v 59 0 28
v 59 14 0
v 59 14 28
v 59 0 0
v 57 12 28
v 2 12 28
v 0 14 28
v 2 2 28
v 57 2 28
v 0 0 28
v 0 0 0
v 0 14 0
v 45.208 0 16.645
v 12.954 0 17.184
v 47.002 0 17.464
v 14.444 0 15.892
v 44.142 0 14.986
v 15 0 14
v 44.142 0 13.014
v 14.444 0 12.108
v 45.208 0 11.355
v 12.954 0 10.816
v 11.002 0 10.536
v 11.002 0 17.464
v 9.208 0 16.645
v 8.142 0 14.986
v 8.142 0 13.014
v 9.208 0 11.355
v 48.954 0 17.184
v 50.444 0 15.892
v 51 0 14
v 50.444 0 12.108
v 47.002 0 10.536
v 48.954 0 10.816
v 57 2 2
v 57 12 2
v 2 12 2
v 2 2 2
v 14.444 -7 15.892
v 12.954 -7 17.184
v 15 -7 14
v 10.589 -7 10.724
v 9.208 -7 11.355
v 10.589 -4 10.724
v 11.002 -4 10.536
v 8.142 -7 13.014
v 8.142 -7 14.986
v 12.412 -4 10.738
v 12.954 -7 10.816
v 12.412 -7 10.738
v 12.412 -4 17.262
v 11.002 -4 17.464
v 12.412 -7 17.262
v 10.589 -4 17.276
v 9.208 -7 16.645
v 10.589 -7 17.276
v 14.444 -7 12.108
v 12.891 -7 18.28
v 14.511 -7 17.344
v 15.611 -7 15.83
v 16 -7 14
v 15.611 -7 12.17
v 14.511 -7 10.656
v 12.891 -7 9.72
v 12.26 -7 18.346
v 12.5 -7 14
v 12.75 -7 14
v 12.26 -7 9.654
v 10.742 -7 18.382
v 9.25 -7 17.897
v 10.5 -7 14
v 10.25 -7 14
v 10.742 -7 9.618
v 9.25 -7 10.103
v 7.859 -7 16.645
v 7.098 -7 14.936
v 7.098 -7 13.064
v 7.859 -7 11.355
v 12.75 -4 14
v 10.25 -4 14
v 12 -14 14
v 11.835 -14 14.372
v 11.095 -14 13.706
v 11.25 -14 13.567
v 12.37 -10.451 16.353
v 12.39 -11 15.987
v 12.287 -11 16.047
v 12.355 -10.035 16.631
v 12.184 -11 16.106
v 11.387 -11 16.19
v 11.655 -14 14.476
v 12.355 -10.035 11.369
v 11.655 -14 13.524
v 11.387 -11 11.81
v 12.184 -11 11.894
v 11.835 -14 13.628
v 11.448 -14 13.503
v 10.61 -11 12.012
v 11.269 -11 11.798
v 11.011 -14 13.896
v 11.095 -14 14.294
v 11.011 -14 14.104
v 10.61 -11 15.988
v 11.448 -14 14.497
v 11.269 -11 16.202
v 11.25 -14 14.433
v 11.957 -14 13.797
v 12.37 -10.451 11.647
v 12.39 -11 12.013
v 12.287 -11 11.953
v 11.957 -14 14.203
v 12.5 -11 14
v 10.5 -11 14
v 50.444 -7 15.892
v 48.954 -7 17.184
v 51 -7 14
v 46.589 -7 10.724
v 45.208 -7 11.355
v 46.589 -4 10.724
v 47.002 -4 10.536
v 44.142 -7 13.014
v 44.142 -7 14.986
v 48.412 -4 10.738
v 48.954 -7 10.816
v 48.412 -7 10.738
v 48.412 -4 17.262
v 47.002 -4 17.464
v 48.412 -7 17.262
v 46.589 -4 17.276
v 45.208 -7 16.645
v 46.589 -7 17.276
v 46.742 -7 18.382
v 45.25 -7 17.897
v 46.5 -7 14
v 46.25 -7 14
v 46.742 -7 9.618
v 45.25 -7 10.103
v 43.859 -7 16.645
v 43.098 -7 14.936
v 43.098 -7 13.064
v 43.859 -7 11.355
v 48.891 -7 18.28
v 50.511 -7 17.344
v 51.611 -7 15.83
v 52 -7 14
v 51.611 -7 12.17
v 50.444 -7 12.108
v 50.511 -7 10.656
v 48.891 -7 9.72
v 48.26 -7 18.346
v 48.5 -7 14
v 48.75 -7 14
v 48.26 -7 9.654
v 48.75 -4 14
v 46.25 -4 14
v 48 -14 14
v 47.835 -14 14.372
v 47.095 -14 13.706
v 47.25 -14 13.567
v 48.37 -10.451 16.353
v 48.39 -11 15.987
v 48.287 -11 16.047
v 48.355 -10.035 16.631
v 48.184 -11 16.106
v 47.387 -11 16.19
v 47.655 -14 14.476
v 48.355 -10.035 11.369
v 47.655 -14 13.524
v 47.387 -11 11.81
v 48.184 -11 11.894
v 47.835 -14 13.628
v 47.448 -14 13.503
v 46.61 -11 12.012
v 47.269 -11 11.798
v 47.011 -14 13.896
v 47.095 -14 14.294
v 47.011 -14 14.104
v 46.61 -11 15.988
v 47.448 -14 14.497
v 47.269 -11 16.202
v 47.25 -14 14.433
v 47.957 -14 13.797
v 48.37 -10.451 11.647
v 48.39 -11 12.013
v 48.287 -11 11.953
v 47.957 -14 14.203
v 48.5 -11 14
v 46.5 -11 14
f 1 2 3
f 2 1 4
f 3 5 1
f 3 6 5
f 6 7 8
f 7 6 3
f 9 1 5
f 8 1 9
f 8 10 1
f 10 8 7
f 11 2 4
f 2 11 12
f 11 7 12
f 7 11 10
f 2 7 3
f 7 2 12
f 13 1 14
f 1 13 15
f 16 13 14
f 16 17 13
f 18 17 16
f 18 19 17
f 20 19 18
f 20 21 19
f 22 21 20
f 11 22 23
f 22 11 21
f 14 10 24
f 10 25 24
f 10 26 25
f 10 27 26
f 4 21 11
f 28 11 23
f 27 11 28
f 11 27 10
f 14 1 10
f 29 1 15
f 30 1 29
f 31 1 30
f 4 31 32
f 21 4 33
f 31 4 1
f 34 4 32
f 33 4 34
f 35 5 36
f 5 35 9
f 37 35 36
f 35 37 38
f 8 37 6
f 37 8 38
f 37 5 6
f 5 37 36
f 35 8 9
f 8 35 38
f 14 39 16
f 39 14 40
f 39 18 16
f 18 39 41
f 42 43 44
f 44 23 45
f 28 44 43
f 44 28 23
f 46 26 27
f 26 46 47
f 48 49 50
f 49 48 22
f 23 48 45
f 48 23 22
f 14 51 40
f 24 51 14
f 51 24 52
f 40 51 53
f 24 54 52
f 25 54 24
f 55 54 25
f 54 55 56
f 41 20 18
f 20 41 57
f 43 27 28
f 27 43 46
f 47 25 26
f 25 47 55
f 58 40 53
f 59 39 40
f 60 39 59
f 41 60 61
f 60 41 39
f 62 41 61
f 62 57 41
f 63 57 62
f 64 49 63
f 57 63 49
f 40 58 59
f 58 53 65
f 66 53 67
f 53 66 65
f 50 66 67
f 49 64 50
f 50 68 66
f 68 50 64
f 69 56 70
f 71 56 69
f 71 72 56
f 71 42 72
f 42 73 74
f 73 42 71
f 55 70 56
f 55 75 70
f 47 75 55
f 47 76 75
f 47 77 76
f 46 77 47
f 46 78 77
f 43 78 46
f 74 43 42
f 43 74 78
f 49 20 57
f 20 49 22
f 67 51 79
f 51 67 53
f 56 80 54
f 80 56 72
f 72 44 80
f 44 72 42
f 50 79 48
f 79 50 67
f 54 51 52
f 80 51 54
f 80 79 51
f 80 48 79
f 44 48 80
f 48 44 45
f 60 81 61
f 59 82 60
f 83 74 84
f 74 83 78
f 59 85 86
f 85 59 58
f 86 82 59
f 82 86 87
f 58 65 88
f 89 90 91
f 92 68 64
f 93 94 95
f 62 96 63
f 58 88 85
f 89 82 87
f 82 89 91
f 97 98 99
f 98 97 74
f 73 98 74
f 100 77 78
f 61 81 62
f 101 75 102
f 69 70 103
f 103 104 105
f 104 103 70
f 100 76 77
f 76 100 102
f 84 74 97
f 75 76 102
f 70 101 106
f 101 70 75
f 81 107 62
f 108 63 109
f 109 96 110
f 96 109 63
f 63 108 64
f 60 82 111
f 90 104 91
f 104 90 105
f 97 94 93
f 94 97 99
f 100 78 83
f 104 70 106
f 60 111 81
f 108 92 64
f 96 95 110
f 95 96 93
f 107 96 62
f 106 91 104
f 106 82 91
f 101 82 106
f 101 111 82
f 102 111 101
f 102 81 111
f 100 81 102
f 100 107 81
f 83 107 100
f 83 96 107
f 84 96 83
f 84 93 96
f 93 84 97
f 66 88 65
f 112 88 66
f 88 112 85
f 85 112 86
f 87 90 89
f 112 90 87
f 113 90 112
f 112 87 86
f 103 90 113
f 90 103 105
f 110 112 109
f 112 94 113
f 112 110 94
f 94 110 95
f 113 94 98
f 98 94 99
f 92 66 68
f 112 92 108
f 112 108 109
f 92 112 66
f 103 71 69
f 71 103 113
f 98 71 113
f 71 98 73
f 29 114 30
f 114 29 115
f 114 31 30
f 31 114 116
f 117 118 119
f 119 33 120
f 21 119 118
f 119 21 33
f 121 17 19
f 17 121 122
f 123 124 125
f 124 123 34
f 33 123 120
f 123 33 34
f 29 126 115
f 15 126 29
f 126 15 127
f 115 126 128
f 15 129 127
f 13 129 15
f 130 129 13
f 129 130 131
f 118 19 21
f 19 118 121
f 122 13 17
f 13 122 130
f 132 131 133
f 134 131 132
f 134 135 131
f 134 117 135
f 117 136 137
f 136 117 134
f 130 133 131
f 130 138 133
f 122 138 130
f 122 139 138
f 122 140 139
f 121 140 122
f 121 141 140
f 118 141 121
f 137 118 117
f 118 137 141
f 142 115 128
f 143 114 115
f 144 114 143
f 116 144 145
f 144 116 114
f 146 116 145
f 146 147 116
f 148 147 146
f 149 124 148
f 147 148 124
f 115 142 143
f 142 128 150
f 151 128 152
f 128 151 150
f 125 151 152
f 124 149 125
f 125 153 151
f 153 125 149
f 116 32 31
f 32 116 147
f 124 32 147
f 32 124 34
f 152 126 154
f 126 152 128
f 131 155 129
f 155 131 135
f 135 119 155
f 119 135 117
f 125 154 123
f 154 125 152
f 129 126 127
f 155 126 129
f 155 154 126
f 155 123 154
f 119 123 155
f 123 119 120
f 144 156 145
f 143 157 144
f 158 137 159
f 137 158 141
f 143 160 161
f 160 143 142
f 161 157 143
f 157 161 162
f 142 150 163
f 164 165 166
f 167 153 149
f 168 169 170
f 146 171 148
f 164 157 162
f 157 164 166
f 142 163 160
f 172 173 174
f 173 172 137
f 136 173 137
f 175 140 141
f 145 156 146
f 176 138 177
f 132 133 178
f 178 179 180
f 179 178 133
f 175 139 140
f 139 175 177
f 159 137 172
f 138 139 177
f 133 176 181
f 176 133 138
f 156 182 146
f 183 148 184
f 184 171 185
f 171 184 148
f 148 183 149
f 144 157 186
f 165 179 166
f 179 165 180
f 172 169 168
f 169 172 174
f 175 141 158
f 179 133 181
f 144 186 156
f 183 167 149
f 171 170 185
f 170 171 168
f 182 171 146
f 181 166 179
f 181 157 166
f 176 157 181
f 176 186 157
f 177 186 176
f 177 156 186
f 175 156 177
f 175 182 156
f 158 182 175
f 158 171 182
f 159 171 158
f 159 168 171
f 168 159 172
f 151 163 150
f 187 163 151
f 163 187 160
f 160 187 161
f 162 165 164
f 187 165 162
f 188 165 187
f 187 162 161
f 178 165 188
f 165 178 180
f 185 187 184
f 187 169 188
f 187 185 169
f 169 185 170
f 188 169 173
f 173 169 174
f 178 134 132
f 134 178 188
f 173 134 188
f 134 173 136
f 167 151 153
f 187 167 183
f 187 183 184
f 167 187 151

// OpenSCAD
difference() {
    cube([59, 14, 28]);
    translate([2, 2, 2])
    cube([55, 10, 28]);
}

nubLength=7;

// First Nub

firstNubXPos=11.5;
firstNubYPos=14;

difference(){
    rotate([90, 0, 0])
    translate([firstNubXPos, firstNubYPos, 0])
    cylinder(h=nubLength, d=7);
    
    rotate([90, 0, 0])
    translate([firstNubXPos, firstNubYPos, 4])
    scale([.5, 2])
    cylinder(h=nubLength, d=5);
}

difference(){
    rotate([90, 0, 0])
    translate([firstNubXPos, firstNubYPos, nubLength])
    cylinder(h=nubLength, d1=9, d2=1);
    
    rotate([90, 0, 0])
    translate([firstNubXPos, firstNubYPos, 4])
    scale([.4, 3])
    cylinder(h=nubLength, d=5);
}

// Second Nub
distanceXFromFirstNub = 36;
difference(){
    rotate([90, 0, 0])
    translate([firstNubXPos + distanceXFromFirstNub, firstNubYPos, 0])
    cylinder(h=nubLength, d=7);
    
    rotate([90, 0, 0])
    translate([firstNubXPos + distanceXFromFirstNub, firstNubYPos, 4])
    scale([.5, 2])
    cylinder(h=nubLength, d=5);
}

difference(){
    rotate([90, 0, 0])
    translate([firstNubXPos + distanceXFromFirstNub, firstNubYPos, nubLength])
    cylinder(h=nubLength, d1=9, d2=1);
    
    rotate([90, 0, 0])
    translate([firstNubXPos + distanceXFromFirstNub, firstNubYPos, 4])
    scale([.4, 3])
    cylinder(h=nubLength, d=5);
}
